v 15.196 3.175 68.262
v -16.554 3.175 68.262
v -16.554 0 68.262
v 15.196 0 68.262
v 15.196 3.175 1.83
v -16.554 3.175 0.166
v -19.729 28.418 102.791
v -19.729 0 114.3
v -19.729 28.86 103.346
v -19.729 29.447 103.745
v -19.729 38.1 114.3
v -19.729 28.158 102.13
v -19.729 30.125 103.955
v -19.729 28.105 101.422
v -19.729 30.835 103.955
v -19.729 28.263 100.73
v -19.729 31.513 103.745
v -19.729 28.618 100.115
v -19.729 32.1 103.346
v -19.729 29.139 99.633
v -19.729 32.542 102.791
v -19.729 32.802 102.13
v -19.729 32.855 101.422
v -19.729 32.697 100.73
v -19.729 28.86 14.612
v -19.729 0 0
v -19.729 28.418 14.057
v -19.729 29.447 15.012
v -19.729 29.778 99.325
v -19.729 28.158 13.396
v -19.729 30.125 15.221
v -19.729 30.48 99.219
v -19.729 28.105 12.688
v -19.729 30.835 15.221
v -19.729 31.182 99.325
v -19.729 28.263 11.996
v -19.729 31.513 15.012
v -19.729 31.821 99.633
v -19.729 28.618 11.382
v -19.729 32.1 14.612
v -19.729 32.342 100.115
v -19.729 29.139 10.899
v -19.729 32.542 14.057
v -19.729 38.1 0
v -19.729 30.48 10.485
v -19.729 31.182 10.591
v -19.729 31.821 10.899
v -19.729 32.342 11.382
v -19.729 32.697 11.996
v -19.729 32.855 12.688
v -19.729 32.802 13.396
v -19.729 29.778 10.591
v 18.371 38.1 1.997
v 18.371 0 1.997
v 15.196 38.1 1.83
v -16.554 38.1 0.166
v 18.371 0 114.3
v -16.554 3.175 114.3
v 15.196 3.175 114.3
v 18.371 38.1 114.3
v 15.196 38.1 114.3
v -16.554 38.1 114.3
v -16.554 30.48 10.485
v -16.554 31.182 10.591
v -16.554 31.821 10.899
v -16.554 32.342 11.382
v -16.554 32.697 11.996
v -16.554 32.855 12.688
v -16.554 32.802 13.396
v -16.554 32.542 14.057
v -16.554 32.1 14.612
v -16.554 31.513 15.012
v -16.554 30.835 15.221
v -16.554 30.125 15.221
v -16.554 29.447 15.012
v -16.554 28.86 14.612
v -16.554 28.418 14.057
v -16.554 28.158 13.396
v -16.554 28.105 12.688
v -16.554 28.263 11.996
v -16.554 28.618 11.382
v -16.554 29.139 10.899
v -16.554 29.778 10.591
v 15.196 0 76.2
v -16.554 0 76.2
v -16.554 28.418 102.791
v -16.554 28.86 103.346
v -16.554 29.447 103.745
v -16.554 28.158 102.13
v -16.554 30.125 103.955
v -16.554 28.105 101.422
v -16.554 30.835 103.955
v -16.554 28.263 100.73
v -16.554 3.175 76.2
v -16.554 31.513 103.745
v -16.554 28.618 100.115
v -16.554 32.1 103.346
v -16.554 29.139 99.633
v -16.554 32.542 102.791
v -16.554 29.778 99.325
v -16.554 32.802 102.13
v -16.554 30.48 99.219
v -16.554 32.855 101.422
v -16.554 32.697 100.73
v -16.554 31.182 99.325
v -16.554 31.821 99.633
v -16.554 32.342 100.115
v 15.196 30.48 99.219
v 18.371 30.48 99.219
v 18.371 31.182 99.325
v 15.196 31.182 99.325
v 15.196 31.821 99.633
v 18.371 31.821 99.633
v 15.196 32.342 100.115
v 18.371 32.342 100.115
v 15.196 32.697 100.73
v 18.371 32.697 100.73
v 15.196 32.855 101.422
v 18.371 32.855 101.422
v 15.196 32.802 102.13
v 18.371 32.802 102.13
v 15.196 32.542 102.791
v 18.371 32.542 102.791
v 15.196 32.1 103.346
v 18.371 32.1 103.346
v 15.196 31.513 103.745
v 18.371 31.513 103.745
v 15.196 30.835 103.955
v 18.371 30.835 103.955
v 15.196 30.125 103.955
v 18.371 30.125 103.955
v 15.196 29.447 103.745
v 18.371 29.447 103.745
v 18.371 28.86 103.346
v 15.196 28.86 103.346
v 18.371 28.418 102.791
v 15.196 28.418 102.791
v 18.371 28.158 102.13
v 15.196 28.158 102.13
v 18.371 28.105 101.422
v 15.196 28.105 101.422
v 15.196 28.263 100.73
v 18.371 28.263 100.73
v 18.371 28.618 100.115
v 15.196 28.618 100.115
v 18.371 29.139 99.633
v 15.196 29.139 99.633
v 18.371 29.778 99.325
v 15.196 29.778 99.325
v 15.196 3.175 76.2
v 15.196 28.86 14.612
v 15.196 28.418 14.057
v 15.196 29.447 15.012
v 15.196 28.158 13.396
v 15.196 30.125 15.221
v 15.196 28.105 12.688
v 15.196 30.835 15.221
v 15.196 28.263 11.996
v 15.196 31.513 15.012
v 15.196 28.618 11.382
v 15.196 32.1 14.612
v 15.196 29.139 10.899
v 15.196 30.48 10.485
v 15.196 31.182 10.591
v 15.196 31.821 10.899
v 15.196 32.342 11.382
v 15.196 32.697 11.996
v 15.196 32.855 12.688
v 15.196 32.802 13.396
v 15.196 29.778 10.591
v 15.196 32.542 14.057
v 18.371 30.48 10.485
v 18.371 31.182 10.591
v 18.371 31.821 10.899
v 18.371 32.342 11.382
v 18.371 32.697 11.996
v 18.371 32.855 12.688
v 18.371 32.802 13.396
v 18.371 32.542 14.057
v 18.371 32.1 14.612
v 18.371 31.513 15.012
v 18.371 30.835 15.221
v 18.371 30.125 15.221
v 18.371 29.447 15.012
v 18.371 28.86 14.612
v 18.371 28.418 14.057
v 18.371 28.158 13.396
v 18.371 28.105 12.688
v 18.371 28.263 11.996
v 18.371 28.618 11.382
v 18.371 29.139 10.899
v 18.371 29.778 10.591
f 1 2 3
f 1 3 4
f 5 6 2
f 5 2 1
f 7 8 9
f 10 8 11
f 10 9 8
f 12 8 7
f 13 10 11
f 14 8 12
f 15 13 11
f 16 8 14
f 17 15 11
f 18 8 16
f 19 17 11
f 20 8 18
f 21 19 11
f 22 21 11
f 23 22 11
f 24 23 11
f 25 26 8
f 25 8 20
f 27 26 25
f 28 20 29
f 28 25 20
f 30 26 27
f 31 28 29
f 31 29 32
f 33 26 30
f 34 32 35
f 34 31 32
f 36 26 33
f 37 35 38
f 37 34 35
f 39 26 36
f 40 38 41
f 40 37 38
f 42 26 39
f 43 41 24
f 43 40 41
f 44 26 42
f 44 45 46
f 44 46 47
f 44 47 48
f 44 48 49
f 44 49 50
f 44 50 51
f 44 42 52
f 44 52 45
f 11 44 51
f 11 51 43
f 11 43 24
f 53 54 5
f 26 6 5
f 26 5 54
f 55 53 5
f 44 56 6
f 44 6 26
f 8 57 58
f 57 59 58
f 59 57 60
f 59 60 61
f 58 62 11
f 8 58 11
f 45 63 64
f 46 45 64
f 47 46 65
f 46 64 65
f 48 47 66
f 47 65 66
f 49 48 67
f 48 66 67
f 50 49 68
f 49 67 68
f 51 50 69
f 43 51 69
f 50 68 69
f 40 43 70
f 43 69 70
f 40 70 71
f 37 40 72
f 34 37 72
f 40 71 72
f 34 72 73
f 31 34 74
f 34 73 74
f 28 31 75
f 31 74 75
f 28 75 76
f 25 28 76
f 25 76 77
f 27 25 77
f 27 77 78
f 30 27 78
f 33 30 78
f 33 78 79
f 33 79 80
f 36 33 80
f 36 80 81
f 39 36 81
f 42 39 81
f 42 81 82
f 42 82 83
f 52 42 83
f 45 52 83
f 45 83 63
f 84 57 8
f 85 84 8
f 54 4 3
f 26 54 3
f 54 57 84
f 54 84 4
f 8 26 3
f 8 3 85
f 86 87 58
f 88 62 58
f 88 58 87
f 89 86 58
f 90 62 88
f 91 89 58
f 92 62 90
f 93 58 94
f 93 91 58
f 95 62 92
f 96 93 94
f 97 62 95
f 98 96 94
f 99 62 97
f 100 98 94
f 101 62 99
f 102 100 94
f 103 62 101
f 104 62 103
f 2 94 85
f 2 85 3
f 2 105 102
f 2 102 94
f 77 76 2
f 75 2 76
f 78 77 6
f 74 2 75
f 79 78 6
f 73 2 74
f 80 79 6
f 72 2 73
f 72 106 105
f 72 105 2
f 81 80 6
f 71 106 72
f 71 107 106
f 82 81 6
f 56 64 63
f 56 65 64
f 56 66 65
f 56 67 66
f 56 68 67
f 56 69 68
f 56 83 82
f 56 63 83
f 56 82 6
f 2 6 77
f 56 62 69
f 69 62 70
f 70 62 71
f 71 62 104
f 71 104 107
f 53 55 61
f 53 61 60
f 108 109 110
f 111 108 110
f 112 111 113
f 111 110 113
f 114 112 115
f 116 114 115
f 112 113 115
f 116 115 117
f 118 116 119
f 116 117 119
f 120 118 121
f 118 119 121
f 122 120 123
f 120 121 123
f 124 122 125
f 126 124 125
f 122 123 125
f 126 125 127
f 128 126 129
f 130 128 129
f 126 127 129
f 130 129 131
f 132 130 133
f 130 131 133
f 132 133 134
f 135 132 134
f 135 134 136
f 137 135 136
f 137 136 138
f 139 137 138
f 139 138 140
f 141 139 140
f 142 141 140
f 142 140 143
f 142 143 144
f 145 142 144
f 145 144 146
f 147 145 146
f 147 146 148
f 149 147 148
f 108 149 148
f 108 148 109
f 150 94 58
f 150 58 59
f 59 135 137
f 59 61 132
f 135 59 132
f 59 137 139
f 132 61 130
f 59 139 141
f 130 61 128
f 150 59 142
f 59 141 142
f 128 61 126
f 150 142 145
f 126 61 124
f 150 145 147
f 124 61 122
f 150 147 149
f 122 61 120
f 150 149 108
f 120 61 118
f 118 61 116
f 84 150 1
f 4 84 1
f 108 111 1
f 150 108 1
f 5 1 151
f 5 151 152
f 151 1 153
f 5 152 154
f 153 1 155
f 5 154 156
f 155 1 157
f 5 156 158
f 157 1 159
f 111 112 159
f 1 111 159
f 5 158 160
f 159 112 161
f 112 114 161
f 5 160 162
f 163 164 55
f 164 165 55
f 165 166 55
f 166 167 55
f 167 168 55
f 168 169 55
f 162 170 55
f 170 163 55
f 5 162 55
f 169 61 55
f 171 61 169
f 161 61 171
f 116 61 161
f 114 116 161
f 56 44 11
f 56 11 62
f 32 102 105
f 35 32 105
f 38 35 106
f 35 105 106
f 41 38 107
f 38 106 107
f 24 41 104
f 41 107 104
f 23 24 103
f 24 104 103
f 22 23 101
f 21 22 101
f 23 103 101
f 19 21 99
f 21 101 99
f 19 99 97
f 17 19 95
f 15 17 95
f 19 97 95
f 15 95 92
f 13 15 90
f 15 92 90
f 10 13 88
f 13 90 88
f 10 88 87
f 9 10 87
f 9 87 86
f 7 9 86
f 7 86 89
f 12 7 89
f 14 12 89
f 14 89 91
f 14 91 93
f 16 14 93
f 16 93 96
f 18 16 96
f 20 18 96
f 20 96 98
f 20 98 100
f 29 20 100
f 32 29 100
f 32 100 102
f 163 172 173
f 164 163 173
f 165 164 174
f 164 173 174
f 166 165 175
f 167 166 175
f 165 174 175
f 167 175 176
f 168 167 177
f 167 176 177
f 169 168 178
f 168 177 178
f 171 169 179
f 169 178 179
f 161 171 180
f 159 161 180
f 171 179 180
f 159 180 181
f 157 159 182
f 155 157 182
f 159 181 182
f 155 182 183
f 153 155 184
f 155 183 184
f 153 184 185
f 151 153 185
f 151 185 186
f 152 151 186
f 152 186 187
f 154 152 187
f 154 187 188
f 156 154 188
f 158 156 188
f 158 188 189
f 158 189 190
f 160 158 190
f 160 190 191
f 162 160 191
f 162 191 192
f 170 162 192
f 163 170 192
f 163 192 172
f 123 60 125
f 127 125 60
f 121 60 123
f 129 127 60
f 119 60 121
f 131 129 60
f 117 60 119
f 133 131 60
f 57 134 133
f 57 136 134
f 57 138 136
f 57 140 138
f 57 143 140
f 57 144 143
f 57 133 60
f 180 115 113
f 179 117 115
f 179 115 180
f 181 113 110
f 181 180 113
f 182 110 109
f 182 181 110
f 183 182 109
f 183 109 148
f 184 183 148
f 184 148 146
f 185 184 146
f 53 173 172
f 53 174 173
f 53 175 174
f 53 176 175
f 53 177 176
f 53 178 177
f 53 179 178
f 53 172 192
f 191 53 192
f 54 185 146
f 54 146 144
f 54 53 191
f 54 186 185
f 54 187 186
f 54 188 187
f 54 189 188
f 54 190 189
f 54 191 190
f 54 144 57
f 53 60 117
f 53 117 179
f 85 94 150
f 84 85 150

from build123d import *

# Parameters (mm, degrees)
BOSS_EXTRUDE1_DEPTH = 114.3
CUT_EXTRUDE1_DEPTH  = 98.425
SKETCH3_R           = 2.38125
CUT_EXTRUDE2_DEPTH  = 98.425
SKETCH4_W           = 31.75
SKETCH4_H           = 7.9375
CUT_EXTRUDE4_DEPTH  = 122.134097336


with BuildPart() as part:
    # Sketch1 → Boss-Extrude1 (new body)
    with BuildSketch(Plane.XY):
        Polygon((18.371241491, 0), (-19.728758509, 0), (-19.728758509, 38.1), (-16.553758509, 38.1), (-16.553758509, 3.175), (15.196241491, 3.175), (15.196241491, 38.1), (18.371241491, 38.1), align=None)
    extrude(amount=BOSS_EXTRUDE1_DEPTH)

    # Sketch2 → Cut-Extrude1 (cut)
    with BuildSketch(Plane(origin=(0, 38.1, 0), x_dir=(1, 0, 0), z_dir=(0, 1, 0))):
        Polygon((-19.728758509, 0), (18.371241491, 0), (18.371241491, -1.996736391), align=None)
    extrude(amount=-CUT_EXTRUDE1_DEPTH, mode=Mode.SUBTRACT)

    # Sketch3 → Cut-Extrude2 (cut)
    with BuildSketch(Plane(origin=(18.371241491, 0, 0), x_dir=(0, 0, -1), z_dir=(1, 0, 0))):
        with Locations((-12.866394699, 30.48)):
            Circle(SKETCH3_R)
        with Locations((-101.6, 30.48)):
            Circle(SKETCH3_R)
    extrude(amount=-CUT_EXTRUDE2_DEPTH, mode=Mode.SUBTRACT)

    # Sketch4 → Cut-Extrude4 (cut, through all)
    with BuildSketch(Plane(origin=(0, 3.175, 0), x_dir=(1, 0, 0), z_dir=(0, 1, 0))):
        with Locations((-0.678758509, -72.23125)):
            Rectangle(SKETCH4_W, SKETCH4_H)
    extrude(amount=-CUT_EXTRUDE4_DEPTH, mode=Mode.SUBTRACT)


solid = part.part
